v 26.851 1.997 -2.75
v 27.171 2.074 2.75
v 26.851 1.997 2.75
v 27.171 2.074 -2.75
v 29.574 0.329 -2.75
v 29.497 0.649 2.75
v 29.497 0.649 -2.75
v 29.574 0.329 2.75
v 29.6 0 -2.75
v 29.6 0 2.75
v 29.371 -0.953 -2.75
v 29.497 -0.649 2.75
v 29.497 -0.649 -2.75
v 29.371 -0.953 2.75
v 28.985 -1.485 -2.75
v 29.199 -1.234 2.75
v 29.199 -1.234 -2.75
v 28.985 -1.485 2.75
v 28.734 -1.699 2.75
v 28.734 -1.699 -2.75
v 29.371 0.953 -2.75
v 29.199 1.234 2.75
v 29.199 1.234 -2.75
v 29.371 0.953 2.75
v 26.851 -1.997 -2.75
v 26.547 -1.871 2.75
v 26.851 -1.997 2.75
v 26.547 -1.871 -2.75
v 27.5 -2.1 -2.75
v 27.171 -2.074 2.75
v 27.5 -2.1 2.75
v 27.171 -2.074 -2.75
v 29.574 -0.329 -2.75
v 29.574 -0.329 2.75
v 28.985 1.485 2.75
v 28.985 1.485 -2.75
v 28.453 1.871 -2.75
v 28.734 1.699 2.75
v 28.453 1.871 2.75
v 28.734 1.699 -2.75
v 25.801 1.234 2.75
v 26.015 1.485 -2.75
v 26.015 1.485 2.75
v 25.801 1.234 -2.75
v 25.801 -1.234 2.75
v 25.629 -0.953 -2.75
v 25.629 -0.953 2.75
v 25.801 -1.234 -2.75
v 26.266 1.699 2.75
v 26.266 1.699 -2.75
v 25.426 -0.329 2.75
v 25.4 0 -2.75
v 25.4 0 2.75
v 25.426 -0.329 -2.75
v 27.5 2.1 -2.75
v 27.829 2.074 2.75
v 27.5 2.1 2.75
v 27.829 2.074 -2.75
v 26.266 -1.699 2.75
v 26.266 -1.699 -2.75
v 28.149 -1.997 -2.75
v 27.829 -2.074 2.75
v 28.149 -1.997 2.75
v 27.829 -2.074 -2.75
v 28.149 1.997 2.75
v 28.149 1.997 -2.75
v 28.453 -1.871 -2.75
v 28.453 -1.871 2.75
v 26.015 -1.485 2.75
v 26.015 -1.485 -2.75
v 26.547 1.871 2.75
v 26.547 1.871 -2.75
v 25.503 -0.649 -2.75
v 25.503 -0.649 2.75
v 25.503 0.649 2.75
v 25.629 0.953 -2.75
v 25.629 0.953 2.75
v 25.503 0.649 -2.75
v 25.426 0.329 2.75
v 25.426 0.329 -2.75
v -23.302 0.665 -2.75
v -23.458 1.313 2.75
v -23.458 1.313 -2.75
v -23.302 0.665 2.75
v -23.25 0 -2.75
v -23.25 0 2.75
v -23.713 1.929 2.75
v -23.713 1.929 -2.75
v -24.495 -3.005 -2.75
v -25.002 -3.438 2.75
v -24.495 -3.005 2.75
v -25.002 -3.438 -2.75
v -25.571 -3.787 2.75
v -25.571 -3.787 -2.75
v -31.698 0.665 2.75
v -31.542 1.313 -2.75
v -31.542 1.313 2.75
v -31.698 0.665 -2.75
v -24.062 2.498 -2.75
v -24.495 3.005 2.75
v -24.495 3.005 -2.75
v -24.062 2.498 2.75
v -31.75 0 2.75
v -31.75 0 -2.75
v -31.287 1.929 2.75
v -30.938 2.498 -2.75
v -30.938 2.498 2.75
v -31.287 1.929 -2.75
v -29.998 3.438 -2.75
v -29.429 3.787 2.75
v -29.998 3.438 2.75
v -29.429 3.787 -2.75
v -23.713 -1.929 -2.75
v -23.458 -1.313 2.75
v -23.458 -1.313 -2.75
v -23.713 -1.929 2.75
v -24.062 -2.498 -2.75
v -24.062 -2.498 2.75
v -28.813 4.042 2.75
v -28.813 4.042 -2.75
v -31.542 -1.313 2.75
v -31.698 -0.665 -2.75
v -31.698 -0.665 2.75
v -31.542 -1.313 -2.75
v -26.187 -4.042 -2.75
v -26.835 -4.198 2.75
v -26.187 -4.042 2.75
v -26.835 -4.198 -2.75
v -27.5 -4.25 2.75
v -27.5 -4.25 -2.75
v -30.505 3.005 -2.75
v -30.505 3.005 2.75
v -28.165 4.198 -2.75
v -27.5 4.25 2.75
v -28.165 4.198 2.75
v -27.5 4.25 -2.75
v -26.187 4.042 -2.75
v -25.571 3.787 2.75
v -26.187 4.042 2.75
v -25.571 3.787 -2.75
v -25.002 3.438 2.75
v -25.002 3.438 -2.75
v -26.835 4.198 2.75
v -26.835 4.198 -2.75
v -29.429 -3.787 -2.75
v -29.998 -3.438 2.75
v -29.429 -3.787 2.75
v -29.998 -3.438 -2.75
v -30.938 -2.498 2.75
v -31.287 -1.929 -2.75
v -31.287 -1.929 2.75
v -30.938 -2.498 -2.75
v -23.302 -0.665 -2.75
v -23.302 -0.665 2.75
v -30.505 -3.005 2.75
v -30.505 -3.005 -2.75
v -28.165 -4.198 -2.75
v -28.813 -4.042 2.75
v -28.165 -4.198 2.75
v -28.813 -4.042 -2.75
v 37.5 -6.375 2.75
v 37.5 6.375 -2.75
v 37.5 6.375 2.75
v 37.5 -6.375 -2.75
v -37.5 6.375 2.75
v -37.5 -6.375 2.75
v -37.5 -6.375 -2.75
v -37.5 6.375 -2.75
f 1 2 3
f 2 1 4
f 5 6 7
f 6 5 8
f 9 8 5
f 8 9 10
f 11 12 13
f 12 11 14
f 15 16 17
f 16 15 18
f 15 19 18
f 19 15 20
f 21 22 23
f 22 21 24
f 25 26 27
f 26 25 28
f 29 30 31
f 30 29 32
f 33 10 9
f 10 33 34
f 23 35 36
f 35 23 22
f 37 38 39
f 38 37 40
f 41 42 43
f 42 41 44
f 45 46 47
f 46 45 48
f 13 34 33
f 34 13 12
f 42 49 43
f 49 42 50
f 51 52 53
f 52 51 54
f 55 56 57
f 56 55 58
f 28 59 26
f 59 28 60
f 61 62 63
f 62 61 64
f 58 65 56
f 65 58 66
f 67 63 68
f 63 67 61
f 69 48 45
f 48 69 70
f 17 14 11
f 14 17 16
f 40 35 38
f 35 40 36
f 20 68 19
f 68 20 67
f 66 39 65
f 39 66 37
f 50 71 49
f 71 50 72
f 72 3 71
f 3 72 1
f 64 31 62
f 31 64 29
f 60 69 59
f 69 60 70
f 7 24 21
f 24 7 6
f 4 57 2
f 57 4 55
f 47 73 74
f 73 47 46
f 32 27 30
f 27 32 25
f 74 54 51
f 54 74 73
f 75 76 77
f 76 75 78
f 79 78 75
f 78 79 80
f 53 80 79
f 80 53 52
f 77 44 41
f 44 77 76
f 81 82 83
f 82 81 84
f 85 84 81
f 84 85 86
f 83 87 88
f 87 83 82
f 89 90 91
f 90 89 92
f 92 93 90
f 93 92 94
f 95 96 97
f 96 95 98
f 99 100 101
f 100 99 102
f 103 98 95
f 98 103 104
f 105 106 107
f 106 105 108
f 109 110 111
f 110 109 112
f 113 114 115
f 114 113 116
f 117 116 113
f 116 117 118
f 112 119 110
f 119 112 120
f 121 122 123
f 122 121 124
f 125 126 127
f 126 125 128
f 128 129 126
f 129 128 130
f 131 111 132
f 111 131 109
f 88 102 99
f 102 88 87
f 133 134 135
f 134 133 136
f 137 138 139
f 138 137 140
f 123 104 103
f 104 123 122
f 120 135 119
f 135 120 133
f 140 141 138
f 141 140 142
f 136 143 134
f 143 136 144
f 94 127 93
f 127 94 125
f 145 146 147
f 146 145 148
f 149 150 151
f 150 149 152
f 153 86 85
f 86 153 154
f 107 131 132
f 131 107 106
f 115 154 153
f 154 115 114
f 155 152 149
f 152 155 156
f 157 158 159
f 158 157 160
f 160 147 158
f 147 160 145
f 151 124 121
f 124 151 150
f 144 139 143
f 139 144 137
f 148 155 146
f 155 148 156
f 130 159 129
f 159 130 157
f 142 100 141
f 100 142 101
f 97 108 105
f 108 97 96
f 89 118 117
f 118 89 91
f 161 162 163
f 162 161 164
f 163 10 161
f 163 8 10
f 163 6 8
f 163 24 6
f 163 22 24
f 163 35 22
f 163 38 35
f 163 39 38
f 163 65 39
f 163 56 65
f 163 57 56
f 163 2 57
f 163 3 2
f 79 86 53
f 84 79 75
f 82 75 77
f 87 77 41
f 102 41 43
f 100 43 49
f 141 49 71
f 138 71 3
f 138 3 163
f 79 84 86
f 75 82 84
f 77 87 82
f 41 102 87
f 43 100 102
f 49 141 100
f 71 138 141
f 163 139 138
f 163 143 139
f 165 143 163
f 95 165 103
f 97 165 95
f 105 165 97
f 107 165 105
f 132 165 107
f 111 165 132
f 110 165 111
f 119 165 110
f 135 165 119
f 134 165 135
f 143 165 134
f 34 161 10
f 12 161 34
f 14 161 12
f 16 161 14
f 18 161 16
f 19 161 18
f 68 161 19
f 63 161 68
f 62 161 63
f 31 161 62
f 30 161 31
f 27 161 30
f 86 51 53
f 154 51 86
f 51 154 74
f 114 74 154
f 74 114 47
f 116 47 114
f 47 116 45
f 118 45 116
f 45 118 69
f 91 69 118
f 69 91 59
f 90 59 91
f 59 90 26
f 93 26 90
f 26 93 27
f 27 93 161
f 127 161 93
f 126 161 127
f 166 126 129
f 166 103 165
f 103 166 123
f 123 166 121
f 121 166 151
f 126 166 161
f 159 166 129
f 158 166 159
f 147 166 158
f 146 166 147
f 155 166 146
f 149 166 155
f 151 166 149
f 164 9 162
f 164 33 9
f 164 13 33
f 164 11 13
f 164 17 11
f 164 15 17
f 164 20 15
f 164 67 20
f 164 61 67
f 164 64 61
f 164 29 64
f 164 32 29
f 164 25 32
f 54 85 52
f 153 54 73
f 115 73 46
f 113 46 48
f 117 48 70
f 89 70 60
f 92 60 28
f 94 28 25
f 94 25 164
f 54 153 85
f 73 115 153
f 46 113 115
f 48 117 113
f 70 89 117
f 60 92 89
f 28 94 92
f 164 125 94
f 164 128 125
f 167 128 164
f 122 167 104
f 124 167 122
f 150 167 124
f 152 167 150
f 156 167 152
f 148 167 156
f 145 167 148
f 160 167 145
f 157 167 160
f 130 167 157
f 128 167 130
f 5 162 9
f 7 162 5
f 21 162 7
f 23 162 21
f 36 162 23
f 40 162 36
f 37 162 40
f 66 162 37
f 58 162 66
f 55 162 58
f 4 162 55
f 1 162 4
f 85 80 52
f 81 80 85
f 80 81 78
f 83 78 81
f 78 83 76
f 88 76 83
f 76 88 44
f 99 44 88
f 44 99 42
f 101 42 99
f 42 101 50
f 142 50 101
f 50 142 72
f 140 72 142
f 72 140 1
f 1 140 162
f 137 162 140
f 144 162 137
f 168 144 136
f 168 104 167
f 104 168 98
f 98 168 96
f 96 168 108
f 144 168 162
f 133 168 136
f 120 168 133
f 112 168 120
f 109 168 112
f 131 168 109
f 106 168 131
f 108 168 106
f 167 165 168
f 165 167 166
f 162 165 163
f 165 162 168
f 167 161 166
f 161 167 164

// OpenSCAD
// file: hexagone.scad
function cot(x)=1/tan(x);

module Hexagone(cle,h)
{
	angle = 360/6;		// 6 pans
	cote = cle * cot(angle);
	echo(angle, cot(angle), cote);
	echo(acos(.6));

	union()
	{
		rotate([0,0,0])
			cube([cle,cote,h],center=true);
		rotate([0,0,angle])
			cube([cle,cote,h],center=true);
		rotate([0,0,2*angle])
			cube([cle,cote,h],center=true);
	}
}
// file: utils.scad
module mv(x, y, z) {
    translate([x,y,z]) {
        children([0 : $children]);
   }
}

module rot(x, y, z) {
    rotate([x,y,z]) {
        children([0 : $children]);
   }
}

module trans() {
    %children();
}

module hash() {
    #children();
}

module fidt() {
    children(0);
    difference() {
        trans()
        children(1);
        hash()
        children(0);
   }
}

module fid() {
    difference() {
        children(1);
        children(0);
   }
}

module dif() {
    difference() {
        children(0);
        children(1);
   }
}

module dift() {
    children(1);
    difference() {
        trans()
        children(0);
        hash()
        children(1);
   }
}

module mirx() {
    children(0);
    mirror([1,0,0]) {
        children(0);
   }
}

module miry() {
    children(0);
    mirror([0,1,0]) {
        children(0);
   }
}

module mirz() {
    children(0);
    mirror([0,0,1]) {
        children(0);
   }
}
// main file
include<utils.scad>
include<hexagone.scad>

$fn=40;
height=5.5;
spacing=55;
lenght=spacing+20;

screw_diam=4.2;

magnet_diam=8.5;


fid() {
    union(){
        mv(spacing/2,0,0)
            cylinder(d=screw_diam,h=100, center=true);
        mv(spacing/-2,0,0)
            cylinder(d=magnet_diam,h=100, center=true);
    }

    cube([lenght, magnet_diam*1.5, height], center=true);
}
